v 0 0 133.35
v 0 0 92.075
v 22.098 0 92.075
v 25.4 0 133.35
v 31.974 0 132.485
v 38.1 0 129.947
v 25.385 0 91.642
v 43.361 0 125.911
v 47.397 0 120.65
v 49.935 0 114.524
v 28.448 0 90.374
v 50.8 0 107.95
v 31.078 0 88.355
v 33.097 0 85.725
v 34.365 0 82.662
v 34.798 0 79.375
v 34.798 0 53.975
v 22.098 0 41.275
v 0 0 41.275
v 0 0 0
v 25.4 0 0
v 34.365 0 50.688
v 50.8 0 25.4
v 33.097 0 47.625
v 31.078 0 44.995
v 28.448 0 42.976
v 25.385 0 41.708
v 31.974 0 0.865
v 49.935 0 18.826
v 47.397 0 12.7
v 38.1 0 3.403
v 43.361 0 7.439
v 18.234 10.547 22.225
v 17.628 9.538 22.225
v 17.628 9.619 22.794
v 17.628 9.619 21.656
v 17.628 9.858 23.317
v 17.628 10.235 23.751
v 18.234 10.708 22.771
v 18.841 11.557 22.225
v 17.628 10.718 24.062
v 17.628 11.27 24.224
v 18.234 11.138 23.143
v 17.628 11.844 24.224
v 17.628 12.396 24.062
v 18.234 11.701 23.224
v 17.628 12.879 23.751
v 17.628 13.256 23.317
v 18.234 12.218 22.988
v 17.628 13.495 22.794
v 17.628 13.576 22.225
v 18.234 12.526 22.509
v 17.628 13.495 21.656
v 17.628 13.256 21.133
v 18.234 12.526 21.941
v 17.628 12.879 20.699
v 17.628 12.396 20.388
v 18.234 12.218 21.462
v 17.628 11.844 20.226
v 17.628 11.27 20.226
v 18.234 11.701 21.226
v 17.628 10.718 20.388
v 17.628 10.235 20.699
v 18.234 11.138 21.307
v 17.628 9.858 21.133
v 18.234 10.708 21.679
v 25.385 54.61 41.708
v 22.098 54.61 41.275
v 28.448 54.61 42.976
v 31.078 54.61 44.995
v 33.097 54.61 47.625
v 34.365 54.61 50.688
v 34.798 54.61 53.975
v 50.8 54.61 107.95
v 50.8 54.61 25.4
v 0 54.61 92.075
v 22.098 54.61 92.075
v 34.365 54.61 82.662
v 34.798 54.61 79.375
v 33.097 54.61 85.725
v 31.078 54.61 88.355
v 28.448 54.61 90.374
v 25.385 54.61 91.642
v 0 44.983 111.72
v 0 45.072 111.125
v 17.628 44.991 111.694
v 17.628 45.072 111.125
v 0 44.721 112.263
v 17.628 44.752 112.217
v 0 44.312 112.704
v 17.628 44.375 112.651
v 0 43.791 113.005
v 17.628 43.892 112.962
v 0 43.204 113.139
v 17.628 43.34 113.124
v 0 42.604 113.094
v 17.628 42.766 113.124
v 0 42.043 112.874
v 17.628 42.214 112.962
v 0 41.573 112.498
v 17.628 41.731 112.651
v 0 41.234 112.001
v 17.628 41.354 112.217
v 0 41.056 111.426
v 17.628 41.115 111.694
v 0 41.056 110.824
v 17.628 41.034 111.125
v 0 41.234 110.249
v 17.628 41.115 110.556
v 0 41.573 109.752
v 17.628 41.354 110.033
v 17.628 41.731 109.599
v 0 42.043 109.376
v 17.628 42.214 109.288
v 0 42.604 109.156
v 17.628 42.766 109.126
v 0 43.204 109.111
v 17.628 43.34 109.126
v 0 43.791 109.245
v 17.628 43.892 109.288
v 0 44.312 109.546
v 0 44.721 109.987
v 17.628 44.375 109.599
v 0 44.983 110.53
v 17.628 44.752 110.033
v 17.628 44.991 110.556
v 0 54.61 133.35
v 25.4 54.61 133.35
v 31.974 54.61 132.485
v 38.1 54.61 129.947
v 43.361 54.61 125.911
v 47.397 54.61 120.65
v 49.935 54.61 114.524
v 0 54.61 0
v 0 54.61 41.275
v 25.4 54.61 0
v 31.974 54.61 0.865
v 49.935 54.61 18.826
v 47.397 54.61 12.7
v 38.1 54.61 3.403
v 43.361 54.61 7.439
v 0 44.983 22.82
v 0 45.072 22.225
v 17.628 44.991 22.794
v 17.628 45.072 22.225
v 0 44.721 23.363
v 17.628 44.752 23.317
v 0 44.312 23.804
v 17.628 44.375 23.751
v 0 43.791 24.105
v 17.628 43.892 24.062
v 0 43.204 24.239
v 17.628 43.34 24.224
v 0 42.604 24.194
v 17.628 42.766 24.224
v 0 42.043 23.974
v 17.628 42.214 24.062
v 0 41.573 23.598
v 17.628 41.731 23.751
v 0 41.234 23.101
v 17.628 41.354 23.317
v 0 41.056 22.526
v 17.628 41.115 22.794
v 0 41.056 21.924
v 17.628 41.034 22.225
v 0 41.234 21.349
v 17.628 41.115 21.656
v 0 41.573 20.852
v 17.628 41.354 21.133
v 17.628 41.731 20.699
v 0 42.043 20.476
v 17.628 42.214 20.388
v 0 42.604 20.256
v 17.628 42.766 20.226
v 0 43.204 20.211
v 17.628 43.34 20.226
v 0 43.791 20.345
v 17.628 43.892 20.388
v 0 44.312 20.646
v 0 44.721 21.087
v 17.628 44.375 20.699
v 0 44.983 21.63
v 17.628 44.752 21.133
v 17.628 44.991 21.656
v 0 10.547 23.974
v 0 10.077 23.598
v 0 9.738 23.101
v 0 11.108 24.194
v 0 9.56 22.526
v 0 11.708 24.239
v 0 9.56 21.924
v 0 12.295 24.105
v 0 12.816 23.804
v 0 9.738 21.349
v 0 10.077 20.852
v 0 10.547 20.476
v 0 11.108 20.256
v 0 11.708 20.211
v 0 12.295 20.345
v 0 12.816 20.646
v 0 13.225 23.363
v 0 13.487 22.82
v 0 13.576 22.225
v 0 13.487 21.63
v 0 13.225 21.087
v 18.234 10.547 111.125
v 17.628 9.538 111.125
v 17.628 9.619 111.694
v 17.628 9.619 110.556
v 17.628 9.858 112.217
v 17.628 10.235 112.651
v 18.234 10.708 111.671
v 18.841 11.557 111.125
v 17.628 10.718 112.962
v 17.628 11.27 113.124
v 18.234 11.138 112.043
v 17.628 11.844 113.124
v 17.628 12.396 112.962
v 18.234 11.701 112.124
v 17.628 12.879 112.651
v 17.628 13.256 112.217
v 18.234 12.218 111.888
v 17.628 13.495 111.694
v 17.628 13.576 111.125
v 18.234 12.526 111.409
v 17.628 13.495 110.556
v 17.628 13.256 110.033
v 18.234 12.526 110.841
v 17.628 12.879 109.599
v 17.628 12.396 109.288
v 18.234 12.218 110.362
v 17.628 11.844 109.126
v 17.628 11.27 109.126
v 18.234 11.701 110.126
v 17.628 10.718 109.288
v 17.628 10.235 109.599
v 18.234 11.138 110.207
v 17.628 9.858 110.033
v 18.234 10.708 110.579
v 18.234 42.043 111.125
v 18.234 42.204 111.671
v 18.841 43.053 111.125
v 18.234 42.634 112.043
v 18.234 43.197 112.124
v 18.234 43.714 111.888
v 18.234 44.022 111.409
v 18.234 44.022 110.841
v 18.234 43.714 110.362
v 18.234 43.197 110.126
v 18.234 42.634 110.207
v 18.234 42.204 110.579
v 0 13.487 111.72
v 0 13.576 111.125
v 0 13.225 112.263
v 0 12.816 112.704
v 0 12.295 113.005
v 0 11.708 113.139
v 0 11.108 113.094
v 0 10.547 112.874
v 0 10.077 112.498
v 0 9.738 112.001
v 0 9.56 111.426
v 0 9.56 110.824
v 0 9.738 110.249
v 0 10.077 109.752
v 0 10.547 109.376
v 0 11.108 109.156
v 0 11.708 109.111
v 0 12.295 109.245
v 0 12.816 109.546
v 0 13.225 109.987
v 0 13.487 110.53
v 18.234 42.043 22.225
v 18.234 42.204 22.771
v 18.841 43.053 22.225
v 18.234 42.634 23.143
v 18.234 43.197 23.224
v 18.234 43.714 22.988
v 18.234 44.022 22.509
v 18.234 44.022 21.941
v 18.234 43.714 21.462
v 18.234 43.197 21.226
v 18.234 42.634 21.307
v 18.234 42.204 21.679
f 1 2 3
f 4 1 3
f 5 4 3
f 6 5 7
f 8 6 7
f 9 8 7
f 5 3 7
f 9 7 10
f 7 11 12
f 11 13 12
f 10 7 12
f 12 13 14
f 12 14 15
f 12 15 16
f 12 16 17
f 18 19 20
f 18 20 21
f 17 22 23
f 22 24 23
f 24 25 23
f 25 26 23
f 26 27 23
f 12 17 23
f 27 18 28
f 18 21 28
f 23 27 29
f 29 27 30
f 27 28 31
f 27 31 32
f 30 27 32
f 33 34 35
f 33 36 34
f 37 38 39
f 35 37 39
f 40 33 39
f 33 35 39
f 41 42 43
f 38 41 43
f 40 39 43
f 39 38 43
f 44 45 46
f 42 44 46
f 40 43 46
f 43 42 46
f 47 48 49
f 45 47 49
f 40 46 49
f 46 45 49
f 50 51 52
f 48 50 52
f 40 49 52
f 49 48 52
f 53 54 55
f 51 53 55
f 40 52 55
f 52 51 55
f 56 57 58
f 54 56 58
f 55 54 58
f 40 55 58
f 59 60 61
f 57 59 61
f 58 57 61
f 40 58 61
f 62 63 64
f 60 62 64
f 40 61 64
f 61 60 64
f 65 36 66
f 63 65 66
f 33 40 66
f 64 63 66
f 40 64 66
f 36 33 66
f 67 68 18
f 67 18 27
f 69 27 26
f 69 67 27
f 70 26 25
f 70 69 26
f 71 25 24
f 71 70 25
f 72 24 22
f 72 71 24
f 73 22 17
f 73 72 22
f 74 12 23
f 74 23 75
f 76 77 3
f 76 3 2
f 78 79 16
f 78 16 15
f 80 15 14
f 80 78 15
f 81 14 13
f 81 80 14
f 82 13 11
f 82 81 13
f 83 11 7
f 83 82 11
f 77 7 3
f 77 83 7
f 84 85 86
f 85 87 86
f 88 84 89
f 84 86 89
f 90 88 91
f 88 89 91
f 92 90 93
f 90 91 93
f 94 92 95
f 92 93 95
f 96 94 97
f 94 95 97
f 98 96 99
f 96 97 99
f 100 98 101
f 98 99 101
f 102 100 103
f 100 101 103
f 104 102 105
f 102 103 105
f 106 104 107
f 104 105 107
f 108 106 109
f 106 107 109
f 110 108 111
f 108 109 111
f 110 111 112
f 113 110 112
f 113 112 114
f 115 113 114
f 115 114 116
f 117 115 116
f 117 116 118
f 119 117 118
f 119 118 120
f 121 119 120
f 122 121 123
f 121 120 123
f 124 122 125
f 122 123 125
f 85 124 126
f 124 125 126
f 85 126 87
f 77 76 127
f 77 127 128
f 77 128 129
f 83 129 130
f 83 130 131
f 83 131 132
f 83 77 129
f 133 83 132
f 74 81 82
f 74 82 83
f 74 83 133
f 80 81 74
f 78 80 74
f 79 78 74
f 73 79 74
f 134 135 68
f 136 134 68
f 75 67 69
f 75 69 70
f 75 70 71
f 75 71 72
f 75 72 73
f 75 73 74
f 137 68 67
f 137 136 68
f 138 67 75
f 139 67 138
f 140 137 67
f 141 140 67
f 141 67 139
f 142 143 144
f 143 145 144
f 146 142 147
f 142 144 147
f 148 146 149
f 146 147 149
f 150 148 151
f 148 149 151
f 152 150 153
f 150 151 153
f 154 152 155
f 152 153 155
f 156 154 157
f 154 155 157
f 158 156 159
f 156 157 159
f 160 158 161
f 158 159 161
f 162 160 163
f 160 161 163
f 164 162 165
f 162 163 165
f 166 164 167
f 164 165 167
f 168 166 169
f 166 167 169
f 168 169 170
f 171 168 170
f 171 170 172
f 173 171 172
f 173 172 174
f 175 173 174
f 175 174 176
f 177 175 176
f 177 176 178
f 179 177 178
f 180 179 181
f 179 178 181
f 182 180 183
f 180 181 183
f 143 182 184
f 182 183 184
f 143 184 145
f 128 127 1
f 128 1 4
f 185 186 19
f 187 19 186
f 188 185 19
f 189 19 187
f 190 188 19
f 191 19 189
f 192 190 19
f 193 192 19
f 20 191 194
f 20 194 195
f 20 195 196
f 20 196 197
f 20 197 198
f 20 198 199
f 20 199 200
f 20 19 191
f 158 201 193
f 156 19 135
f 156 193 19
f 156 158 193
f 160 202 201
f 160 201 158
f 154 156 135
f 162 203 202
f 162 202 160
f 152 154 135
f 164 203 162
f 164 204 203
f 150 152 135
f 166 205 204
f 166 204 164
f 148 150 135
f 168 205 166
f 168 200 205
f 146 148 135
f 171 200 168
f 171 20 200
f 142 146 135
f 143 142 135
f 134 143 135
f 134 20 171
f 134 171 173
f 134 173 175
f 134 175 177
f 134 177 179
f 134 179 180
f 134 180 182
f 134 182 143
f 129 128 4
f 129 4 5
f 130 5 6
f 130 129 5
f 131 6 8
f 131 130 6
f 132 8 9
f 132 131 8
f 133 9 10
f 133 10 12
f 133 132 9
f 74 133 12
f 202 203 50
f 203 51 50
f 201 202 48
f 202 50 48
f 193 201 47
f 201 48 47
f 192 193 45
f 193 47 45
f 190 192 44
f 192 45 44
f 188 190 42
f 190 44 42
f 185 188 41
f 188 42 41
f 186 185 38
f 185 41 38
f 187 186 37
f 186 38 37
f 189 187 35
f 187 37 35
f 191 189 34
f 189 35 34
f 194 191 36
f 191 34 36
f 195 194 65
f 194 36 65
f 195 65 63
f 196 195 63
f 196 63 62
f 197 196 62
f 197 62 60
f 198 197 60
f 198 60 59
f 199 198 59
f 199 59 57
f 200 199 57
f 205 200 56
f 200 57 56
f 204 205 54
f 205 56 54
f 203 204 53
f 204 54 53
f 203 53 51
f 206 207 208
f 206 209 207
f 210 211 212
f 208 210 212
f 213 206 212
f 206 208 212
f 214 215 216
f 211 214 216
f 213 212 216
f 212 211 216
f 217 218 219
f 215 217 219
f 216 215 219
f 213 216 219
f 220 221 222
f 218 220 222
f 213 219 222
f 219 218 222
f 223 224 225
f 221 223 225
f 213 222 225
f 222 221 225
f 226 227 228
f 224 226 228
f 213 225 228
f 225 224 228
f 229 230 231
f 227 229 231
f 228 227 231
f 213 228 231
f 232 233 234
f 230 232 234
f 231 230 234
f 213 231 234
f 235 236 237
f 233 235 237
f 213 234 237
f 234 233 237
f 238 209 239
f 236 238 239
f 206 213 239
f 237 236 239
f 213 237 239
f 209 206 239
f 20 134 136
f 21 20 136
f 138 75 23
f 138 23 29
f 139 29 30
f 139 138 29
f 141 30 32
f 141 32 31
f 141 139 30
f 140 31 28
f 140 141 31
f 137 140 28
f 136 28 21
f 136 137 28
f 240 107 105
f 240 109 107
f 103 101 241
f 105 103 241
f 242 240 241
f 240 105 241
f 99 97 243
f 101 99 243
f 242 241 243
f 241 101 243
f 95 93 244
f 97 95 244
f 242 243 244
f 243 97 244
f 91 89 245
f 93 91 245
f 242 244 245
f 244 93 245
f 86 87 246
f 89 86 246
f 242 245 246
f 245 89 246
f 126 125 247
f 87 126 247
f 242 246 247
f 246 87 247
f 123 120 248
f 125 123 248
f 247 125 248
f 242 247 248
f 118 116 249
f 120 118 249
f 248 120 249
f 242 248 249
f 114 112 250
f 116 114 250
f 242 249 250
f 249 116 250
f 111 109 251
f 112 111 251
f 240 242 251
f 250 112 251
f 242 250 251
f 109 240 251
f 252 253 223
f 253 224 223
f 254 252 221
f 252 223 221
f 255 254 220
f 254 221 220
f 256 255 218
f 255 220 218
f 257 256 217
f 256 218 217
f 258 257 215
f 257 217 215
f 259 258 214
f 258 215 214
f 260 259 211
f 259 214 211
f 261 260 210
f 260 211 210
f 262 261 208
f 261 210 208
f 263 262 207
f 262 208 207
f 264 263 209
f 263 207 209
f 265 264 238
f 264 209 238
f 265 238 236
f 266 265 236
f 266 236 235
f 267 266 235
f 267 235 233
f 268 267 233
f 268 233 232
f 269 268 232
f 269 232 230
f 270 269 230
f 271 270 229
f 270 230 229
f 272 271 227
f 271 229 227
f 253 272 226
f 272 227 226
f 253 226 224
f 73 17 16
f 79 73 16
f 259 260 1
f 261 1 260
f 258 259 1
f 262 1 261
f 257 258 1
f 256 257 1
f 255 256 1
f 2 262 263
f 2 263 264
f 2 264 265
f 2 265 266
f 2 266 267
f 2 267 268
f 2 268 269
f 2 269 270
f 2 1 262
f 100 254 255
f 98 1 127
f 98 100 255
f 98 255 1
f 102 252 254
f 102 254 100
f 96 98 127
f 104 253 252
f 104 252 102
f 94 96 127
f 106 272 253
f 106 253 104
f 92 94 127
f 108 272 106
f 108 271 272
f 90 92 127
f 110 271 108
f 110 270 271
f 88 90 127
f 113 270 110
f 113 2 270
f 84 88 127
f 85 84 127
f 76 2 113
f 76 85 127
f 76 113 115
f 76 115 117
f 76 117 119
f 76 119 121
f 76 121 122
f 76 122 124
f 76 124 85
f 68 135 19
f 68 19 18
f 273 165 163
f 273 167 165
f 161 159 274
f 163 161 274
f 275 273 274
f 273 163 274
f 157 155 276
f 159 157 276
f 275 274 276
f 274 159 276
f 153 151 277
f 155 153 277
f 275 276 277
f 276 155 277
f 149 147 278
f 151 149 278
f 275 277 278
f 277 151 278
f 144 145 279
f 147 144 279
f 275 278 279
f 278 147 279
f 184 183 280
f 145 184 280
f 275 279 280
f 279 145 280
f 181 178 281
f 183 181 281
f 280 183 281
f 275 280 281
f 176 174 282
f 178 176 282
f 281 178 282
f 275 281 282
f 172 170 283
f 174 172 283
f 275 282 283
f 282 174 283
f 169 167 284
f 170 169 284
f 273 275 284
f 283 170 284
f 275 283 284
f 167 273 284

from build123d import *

# Parameters (mm, degrees)
F0_W     = 50.8
F0_H     = 54.61
F1_DEPTH = 133.35
F3_D     = 4.0386
F3_DEPTH = 17.6276
F3_TIP   = 1.213317848
F5_DEPTH = 54.611


with BuildPart() as f1:
    # F0 (on Top) → F1 (new body)
    with BuildSketch(Plane.XY):
        with Locations((25.4, 27.305)):
            Rectangle(F0_W, F0_H)
    extrude(amount=F1_DEPTH)

    # F3
    with Locations(Plane(origin=(0, 0, 0), x_dir=(0, -1, 0), z_dir=(-1, 0, 0))):
        with Locations((-11.557, 22.225), (-43.053, 22.225), (-11.557, 111.125), (-43.053, 111.125)):
            Hole(F3_D / 2, depth=F3_DEPTH)
            with Locations((0, 0, -(F3_DEPTH + F3_TIP / 2))):  # 118° drill point
                Cone(0, F3_D / 2, F3_TIP, mode=Mode.SUBTRACT)

    # F4 (on face) → F5 (intersect, through all)
    with BuildSketch(Plane(origin=(0, 54.61, 0), x_dir=(-1, 0, 0), z_dir=(0, 1, 0))):
        with BuildLine():
            Line((-22.098, 92.075), (0, 92.075))
            Line((0, 92.075), (0, 133.35))
            Line((0, 133.35), (-25.4, 133.35))
            ThreePointArc((-25.4, 133.35), (-43.3605122421, 125.9105122421), (-50.8, 107.95))
            Line((-50.8, 107.95), (-50.8, 25.4))
            ThreePointArc((-50.8, 25.4), (-43.3605122421, 7.4394877579), (-25.4, 0))
            Line((-25.4, 0), (0, 0))
            Line((0, 0), (0, 41.275))
            Line((0, 41.275), (-22.098, 41.275))
            ThreePointArc((-22.098, 41.275), (-31.0782561211, 44.9947438789), (-34.798, 53.975))
            Line((-34.798, 53.975), (-34.798, 79.375))
            ThreePointArc((-34.798, 79.375), (-31.0782561211, 88.3552561211), (-22.098, 92.075))
        make_face()
    extrude(amount=-F5_DEPTH, mode=Mode.INTERSECT)


solid = f1.part
